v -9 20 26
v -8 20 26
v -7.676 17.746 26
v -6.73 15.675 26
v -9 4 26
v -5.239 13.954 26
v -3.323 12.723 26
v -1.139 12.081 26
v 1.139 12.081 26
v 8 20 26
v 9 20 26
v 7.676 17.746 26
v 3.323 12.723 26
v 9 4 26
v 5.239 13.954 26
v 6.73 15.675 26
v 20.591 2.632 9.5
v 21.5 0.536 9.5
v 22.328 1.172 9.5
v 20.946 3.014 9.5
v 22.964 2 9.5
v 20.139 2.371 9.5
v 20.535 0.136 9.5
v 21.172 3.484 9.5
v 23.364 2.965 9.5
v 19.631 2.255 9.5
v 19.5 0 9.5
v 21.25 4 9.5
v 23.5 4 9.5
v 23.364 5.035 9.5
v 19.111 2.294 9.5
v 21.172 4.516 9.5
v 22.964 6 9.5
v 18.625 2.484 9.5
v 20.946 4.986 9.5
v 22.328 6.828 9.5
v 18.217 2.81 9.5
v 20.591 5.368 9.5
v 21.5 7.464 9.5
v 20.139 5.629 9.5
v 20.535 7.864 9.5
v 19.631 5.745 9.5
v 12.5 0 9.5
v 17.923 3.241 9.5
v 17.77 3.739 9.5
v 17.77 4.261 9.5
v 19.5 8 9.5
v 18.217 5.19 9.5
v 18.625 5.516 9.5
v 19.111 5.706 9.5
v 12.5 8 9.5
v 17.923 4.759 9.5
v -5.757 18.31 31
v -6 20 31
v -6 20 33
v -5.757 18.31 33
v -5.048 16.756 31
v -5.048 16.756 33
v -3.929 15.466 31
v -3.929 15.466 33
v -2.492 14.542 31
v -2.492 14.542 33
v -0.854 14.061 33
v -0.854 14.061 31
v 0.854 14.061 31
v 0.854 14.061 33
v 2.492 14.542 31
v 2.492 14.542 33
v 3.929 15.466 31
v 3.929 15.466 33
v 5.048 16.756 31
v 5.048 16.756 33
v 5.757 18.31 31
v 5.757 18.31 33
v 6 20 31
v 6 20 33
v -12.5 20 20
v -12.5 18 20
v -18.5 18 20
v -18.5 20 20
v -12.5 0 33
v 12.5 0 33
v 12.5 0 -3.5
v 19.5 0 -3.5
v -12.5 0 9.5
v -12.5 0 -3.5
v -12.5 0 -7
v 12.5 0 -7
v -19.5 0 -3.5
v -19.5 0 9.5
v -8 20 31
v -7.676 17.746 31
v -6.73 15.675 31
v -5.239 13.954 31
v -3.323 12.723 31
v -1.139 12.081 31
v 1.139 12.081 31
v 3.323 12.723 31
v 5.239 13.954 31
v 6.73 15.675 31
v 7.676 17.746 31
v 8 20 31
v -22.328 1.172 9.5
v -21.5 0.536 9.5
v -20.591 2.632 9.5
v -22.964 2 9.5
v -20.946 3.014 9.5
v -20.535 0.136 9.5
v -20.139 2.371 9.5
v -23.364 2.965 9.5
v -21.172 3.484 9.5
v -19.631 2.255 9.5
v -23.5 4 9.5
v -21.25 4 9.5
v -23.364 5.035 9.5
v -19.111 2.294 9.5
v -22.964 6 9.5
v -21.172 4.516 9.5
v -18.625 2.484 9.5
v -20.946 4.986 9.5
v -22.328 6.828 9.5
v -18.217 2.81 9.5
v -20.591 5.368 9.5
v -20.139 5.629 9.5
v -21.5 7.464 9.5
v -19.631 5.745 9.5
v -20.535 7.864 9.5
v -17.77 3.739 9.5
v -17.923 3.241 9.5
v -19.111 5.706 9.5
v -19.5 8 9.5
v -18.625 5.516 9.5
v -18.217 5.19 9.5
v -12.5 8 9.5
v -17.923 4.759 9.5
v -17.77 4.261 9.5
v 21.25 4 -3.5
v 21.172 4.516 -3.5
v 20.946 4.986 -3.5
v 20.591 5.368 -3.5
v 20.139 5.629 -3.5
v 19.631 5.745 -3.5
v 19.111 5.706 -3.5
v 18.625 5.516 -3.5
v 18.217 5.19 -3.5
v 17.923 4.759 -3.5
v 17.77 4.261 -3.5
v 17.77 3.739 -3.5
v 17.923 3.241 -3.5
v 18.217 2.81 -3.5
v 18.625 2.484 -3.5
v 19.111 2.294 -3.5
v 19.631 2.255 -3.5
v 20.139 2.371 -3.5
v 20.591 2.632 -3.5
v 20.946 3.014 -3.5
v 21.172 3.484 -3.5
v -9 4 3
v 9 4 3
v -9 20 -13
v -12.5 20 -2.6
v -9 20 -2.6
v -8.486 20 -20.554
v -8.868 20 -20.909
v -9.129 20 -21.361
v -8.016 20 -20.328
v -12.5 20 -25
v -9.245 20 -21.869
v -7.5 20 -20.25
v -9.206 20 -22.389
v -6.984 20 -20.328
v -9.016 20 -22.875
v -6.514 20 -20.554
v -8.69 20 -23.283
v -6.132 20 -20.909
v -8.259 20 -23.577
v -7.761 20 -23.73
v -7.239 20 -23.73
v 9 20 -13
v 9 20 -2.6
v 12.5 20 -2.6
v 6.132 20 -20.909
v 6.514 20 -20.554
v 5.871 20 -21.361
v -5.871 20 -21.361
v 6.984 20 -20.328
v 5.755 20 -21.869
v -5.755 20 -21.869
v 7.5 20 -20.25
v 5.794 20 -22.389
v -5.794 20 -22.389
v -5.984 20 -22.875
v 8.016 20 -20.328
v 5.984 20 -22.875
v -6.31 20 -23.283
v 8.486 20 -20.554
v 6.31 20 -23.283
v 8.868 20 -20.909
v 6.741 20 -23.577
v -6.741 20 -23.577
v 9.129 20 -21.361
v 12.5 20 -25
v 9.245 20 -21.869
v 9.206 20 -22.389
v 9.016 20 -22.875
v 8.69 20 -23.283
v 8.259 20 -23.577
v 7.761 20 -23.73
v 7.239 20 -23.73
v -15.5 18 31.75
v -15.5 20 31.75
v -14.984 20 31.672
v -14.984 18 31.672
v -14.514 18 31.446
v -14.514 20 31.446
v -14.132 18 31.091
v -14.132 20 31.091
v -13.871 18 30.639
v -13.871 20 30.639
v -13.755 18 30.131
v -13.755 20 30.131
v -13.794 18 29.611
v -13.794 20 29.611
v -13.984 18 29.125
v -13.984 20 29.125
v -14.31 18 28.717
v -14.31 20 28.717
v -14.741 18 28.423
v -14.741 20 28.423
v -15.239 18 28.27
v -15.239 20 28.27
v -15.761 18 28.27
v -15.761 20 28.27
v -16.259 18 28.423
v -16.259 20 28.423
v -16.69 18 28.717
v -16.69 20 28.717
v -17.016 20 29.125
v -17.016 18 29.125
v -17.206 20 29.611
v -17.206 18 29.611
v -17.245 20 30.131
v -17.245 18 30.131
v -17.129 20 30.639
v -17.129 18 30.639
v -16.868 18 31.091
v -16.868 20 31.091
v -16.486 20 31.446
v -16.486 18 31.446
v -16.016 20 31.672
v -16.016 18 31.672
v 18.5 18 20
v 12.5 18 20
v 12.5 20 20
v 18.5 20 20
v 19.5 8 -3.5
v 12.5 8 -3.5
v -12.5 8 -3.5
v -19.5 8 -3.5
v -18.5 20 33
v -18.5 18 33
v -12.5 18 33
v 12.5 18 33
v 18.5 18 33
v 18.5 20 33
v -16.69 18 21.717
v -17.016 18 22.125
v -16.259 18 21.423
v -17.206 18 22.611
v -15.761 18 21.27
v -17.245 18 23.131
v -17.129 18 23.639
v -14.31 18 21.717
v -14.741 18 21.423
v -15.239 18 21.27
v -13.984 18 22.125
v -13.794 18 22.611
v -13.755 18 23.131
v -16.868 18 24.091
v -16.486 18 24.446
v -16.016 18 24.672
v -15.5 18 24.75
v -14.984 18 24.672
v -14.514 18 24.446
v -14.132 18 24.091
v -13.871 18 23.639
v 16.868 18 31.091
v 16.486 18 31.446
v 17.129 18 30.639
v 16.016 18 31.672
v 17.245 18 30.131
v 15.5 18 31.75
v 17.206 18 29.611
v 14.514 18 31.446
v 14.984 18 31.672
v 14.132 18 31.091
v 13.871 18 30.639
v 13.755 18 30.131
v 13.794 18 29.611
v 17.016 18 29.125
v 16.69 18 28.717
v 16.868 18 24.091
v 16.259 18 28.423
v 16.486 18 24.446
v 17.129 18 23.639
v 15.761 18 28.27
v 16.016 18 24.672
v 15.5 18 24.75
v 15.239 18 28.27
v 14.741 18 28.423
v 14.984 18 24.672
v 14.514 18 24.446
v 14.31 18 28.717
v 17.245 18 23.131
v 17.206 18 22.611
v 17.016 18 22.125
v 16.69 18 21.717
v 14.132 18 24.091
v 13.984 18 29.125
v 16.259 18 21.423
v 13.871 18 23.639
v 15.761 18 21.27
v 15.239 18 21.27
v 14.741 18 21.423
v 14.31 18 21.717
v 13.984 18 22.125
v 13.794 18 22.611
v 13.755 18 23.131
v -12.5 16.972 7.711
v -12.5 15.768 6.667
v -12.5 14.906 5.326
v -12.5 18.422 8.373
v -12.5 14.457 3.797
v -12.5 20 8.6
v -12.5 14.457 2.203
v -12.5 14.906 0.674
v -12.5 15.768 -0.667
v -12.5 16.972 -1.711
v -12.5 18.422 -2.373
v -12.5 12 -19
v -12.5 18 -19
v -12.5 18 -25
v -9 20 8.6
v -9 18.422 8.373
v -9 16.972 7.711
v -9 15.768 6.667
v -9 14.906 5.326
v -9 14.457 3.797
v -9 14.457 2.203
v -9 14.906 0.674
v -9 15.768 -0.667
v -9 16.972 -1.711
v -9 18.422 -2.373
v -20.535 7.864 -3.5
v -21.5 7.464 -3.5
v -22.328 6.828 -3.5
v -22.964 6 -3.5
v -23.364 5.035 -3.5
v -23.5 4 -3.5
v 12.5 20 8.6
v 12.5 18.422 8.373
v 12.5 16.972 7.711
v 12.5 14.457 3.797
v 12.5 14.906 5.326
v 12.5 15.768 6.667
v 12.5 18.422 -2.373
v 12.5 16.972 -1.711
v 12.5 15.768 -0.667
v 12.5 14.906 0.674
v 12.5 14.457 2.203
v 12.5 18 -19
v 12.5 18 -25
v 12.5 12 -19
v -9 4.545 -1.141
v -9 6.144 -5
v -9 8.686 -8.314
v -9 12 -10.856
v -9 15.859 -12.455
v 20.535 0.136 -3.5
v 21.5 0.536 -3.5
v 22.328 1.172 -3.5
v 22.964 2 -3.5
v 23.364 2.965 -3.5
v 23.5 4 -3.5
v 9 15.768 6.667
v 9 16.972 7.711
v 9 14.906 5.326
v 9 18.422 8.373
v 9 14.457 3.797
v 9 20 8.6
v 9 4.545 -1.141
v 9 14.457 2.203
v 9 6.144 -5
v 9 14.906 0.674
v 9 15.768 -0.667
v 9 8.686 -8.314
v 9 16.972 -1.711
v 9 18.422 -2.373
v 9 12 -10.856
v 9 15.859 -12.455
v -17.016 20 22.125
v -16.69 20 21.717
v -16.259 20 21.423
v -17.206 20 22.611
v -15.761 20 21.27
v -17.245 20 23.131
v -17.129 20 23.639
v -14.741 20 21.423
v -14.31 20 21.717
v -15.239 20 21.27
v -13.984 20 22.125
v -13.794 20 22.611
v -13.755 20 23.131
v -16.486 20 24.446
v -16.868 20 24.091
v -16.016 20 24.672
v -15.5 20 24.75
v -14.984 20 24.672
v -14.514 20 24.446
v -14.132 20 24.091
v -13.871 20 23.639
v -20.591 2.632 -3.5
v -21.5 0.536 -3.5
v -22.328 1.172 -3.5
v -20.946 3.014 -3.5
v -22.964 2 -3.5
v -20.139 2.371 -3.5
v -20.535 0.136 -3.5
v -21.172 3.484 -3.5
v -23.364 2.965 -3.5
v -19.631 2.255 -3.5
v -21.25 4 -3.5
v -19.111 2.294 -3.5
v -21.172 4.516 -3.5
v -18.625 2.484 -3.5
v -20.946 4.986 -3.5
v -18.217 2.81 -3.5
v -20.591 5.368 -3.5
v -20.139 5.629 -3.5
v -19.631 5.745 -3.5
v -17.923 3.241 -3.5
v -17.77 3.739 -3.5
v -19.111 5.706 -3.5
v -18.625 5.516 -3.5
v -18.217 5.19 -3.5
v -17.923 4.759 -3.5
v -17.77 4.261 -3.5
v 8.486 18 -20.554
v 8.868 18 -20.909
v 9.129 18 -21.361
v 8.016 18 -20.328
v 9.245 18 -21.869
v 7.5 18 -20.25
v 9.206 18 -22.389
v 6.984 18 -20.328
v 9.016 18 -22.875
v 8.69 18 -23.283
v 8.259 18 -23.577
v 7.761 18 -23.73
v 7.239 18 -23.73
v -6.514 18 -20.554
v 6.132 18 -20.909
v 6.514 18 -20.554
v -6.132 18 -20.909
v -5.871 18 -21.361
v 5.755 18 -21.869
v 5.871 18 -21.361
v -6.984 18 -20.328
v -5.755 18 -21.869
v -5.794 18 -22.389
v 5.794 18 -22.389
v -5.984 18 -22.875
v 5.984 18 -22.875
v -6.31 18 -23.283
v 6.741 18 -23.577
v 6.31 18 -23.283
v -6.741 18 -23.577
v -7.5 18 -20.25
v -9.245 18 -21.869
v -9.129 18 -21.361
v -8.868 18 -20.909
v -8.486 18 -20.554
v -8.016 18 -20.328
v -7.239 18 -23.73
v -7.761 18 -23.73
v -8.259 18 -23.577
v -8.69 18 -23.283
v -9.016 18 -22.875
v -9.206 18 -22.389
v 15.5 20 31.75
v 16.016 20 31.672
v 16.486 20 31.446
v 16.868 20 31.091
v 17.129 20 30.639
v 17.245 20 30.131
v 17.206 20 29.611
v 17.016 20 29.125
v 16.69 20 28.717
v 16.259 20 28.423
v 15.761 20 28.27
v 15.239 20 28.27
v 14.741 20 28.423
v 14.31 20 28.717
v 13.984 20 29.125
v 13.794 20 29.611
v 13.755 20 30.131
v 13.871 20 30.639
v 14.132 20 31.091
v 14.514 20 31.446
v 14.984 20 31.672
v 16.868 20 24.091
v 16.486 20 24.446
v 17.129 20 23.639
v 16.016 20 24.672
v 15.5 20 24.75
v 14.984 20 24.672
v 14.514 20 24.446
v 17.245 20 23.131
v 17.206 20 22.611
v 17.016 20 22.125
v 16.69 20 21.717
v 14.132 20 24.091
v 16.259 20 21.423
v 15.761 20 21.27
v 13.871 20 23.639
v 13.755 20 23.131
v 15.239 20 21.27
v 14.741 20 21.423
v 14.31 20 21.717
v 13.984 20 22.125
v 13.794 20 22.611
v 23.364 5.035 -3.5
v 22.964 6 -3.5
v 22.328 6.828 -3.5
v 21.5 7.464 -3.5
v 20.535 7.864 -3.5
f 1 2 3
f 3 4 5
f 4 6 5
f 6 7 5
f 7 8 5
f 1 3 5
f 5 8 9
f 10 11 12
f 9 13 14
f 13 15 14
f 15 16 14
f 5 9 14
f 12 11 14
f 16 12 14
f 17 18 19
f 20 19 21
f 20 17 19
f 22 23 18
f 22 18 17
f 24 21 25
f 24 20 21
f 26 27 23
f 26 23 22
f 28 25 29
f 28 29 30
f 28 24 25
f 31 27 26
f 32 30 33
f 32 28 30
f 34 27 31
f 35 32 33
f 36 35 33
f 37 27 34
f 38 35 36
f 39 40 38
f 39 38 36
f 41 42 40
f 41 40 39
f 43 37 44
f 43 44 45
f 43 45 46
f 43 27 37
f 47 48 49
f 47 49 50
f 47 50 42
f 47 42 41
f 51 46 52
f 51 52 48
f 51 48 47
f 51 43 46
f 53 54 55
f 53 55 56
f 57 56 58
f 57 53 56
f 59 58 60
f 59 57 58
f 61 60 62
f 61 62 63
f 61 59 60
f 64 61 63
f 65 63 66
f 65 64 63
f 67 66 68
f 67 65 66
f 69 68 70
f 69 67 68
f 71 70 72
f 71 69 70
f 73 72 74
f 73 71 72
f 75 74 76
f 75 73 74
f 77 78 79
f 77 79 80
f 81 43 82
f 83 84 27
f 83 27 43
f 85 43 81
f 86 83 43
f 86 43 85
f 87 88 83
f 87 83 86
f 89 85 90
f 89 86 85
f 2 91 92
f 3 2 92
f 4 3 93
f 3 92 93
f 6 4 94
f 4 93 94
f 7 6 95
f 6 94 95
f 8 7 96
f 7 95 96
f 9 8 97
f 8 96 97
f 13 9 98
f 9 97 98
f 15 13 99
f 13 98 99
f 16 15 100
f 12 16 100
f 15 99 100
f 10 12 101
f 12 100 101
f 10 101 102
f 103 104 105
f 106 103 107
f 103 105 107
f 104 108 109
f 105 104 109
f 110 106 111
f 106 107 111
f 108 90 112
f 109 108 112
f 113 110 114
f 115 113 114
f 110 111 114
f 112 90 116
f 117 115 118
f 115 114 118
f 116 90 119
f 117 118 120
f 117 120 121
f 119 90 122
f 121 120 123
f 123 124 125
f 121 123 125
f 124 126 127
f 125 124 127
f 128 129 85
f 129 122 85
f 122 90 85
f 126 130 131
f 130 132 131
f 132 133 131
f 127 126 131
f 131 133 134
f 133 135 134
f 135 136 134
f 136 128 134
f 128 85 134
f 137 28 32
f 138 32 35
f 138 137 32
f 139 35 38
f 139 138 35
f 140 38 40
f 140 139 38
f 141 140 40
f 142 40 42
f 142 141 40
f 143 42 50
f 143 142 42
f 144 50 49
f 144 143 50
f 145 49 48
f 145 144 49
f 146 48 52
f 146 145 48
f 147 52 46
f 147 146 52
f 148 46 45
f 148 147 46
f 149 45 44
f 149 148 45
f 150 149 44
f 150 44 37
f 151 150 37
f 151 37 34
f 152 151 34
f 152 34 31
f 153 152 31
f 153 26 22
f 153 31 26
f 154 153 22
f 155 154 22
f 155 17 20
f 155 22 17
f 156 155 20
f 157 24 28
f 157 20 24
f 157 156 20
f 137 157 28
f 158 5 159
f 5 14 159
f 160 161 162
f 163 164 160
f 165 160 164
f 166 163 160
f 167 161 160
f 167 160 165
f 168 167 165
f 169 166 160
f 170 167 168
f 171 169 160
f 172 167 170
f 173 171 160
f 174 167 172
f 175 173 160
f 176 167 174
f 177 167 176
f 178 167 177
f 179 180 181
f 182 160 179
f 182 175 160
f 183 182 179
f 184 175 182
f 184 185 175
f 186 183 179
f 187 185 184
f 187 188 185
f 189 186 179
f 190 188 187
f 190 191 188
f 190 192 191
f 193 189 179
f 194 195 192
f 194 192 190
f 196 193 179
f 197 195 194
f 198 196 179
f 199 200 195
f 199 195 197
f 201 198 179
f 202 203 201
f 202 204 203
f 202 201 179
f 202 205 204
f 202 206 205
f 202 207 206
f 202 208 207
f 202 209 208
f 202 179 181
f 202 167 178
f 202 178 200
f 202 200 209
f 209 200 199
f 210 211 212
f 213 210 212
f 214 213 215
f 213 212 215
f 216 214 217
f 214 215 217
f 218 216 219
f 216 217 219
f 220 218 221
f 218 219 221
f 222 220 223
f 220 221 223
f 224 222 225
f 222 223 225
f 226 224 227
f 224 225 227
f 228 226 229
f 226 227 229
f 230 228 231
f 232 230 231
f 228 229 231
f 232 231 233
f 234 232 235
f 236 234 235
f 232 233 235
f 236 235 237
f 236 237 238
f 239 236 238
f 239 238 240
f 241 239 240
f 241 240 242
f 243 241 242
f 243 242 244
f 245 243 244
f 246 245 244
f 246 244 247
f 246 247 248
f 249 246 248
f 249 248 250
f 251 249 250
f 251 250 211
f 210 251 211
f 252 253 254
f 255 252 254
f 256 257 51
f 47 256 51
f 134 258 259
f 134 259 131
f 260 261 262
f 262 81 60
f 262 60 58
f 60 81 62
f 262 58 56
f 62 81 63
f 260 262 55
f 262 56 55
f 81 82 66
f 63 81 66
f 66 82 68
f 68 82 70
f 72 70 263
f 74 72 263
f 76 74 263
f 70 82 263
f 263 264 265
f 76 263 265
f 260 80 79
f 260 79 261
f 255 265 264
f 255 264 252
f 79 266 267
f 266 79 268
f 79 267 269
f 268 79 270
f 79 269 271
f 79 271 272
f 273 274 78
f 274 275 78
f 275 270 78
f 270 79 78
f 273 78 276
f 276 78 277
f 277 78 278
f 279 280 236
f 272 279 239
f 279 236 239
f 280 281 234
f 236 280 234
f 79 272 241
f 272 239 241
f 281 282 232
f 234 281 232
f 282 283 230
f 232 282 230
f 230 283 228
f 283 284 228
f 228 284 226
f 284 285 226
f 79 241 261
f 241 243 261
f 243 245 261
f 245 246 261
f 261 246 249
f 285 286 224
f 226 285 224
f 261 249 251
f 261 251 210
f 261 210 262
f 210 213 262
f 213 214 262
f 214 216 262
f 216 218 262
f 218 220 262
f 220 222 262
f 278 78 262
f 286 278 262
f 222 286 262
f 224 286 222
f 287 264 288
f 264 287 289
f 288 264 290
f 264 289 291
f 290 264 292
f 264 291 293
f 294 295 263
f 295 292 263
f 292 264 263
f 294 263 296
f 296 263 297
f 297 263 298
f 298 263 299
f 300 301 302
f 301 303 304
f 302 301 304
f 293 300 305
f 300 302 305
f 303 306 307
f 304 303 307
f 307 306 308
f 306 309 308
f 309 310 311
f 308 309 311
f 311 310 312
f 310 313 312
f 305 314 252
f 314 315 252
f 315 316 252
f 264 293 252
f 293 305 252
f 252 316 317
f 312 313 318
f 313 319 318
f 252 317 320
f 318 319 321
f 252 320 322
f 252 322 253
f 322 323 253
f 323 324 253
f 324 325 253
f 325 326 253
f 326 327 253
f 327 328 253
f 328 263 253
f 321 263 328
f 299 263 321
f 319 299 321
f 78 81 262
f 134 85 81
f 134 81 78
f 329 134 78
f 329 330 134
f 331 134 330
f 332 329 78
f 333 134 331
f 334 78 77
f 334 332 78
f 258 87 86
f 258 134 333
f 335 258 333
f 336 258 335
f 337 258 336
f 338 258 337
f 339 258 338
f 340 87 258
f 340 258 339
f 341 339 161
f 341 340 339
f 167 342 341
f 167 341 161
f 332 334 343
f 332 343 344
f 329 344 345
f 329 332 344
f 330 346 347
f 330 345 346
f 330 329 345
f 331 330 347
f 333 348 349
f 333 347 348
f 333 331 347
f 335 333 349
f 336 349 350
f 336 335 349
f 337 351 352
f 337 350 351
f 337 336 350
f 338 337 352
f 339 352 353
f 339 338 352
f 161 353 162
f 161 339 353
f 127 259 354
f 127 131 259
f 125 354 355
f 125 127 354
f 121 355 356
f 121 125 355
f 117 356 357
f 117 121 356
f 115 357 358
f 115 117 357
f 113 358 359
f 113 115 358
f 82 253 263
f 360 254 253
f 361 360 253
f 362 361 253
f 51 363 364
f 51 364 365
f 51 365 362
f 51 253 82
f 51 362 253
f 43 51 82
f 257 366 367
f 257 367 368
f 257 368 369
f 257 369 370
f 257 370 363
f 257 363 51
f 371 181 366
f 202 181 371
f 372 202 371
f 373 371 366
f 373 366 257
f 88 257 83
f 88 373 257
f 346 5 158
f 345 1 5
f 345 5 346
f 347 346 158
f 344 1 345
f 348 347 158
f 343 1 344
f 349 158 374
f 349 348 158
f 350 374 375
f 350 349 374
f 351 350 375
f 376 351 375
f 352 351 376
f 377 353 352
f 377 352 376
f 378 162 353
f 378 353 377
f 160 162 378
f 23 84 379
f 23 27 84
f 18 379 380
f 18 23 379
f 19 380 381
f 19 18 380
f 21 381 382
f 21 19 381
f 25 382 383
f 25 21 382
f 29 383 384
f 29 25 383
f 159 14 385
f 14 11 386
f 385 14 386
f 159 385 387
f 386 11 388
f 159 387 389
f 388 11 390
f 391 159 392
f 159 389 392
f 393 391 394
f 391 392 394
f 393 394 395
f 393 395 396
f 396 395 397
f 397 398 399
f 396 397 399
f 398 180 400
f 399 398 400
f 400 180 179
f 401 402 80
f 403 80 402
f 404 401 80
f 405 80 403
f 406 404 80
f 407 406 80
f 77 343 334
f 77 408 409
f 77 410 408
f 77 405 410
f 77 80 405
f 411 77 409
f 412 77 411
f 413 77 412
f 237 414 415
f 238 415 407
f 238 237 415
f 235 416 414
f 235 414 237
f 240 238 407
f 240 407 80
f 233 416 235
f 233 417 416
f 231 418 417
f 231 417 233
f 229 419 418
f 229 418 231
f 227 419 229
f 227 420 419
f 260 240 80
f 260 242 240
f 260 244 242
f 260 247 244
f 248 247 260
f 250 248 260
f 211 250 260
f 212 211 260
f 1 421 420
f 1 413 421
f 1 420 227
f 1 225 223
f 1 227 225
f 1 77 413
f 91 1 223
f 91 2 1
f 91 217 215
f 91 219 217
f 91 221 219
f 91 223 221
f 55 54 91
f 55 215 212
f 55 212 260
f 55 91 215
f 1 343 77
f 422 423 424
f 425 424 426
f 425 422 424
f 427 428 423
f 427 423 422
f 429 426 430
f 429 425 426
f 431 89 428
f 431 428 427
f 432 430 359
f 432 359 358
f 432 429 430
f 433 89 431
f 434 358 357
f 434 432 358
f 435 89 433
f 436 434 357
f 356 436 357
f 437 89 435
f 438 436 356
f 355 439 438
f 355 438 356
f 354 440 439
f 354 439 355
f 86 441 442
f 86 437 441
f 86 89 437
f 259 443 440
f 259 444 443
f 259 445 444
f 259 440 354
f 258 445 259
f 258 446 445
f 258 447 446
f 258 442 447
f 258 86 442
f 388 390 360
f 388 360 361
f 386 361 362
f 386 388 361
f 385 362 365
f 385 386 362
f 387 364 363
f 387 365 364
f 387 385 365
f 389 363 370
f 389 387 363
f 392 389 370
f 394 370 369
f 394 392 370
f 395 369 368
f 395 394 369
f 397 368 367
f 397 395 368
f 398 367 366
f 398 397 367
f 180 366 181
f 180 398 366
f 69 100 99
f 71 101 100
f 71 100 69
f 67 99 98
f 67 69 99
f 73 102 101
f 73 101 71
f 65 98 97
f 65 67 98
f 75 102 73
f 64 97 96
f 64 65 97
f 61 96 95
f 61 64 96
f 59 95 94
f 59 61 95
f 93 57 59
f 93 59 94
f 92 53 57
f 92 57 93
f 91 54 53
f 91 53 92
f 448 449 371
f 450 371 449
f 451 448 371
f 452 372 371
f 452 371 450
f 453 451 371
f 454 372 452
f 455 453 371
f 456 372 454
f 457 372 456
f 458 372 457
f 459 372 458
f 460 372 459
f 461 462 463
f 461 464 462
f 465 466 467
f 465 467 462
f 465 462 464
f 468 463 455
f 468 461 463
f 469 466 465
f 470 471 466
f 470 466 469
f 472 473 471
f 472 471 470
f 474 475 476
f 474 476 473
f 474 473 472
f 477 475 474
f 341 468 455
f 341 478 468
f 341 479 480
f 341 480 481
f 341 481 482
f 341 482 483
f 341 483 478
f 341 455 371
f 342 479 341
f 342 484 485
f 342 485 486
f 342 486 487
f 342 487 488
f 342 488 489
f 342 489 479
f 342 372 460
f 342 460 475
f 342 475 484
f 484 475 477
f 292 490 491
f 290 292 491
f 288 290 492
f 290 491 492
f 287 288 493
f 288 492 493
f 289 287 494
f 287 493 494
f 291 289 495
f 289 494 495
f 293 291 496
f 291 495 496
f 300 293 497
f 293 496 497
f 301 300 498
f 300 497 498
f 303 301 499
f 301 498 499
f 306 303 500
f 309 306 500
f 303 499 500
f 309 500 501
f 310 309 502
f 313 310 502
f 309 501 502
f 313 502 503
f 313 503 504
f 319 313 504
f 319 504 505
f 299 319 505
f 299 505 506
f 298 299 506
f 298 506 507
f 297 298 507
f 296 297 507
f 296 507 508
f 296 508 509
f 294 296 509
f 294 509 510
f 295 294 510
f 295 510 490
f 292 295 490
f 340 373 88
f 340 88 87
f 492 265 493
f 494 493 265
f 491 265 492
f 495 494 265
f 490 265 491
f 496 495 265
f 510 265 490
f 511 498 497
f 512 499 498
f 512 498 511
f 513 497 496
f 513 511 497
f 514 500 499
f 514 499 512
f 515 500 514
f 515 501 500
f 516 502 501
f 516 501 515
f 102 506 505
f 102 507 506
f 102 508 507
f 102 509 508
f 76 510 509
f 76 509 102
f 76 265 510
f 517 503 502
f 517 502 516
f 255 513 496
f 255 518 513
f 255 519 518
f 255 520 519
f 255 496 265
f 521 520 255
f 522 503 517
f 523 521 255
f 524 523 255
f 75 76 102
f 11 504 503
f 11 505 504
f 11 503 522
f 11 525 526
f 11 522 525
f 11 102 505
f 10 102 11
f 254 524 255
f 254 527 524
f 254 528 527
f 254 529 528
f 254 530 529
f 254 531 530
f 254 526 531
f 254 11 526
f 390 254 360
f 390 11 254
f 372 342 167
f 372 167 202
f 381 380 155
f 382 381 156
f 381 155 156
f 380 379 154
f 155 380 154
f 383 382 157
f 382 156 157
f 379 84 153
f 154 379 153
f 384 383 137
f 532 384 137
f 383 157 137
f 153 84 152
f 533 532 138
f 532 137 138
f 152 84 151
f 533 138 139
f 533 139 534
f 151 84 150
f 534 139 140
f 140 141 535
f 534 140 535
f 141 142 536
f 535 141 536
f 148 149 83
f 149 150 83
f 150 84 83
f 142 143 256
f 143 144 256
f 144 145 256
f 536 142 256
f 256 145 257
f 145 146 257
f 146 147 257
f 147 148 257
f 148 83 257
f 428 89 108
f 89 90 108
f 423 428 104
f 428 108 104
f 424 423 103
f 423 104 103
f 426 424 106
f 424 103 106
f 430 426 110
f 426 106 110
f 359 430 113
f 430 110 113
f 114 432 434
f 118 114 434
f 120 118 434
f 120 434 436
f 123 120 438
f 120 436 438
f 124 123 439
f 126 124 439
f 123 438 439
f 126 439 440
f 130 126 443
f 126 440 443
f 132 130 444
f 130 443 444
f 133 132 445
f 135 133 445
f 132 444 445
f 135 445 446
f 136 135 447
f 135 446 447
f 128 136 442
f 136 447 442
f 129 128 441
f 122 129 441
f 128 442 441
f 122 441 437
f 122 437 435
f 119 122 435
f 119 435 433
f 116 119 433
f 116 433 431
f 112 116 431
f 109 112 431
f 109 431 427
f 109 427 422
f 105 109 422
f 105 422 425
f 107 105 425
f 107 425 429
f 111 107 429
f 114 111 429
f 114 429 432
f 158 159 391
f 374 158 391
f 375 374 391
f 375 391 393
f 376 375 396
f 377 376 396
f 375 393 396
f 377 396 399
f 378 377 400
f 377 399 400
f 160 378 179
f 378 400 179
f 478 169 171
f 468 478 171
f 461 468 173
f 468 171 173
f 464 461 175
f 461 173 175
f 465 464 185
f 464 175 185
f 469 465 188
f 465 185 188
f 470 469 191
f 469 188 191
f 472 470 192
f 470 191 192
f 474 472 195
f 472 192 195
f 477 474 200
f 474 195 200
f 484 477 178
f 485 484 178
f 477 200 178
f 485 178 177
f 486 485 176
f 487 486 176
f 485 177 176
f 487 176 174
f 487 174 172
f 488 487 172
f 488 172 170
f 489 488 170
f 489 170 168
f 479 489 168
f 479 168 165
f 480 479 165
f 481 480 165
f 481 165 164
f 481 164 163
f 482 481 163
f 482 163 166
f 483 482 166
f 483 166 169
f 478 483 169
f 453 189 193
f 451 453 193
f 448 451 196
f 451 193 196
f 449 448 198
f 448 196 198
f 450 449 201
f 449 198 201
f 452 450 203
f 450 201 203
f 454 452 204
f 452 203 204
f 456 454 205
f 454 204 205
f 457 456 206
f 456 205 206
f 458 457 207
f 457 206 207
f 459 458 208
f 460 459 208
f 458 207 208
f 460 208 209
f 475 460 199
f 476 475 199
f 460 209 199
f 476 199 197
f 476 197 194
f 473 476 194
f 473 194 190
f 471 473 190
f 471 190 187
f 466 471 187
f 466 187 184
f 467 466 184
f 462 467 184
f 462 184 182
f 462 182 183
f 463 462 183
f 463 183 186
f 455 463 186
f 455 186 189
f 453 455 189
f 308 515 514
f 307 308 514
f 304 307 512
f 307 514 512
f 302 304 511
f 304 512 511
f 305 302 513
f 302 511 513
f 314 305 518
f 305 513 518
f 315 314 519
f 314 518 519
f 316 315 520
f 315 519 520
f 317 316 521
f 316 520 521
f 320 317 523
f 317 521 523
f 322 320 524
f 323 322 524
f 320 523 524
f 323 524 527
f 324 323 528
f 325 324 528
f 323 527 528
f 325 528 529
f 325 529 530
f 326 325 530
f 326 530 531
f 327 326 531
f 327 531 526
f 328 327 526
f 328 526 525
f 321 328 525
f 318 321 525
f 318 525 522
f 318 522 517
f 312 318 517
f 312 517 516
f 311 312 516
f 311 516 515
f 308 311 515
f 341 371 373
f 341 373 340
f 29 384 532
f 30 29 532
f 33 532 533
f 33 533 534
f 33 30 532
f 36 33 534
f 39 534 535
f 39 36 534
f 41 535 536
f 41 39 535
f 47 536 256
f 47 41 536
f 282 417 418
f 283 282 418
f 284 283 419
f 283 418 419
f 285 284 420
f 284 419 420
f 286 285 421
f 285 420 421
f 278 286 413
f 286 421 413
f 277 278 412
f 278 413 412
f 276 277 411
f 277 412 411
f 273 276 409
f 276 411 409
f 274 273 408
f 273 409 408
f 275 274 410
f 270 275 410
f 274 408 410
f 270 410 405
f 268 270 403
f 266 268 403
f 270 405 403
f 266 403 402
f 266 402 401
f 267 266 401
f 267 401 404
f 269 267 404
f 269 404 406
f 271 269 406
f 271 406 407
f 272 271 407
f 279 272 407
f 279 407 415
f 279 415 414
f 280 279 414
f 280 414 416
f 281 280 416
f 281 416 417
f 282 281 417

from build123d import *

# Parameters (mm, degrees)
CROQUIS2_W                 = 25
CROQUIS2_H                 = 50
SALIENTE_EXTRUIR2_DEPTH    = 20
CROQUIS19_W                = 25
CROQUIS19_H                = 20
SALIENTE_EXTRUIR8_DEPTH    = 6
CORTAR_EXTRUIR1_DEPTH      = 9
CORTAR_EXTRUIR2_DEPTH      = 39.951893407
CORTAR_EXTRUIR2_DEPTH_BACK = 39.951893407
CROQUIS9_R                 = 8
CORTAR_EXTRUIR3_DEPTH      = 5
SALIENTE_EXTRUIR9_DEPTH    = 2
CROQUIS11_W                = 13
CROQUIS11_H                = 2
SALIENTE_EXTRUIR4_DEPTH    = 6
CROQUIS13_W                = 13
CROQUIS13_H                = 2
SALIENTE_EXTRUIR5_DEPTH    = 6
CROQUIS16_R                = 1.75
CORTAR_EXTRUIR6_DEPTH      = 43.793106922
CROQUIS17_W                = 13
CROQUIS17_H                = 8
SALIENTE_EXTRUIR7_DEPTH    = 11
REDONDEO1_R                = 4
CROQUIS12_R                = 1.75
CORTAR_EXTRUIR4_DEPTH      = 46.180194776
CROQUIS14_R                = 1.75
CORTAR_EXTRUIR5_DEPTH      = 46.180194776
CROQUIS18_R                = 1.75
CORTAR_EXTRUIR7_DEPTH      = 48.796443382
REDONDEO1_OF_SIMETR_A1_R   = 4
CROQUIS23_W                = 25
CROQUIS23_H                = 18
CORTAR_EXTRUIR9_DEPTH      = 6
CHAFL_N1_SIZE              = 12


with BuildPart() as part:
    # Croquis2 → Saliente-Extruir2 (new body)
    with BuildSketch(Plane(origin=(0, 0, 0), x_dir=(1, 0, 0), z_dir=(0, 1, 0))):
        Rectangle(CROQUIS2_W, CROQUIS2_H)
    extrude(amount=SALIENTE_EXTRUIR2_DEPTH)

    # Croquis19 → Saliente-Extruir8 (add)
    with BuildSketch(Plane.XY.offset(25)):
        with Locations((0, 10)):
            Rectangle(CROQUIS19_W, CROQUIS19_H)
    extrude(amount=SALIENTE_EXTRUIR8_DEPTH)

    # Croquis4 → Cortar-Extruir1 (cut, symmetric)
    with BuildSketch(Plane(origin=(0, 0, 0), x_dir=(0, 0, -1), z_dir=(1, 0, 0))):
        with BuildLine():
            Line((-26, 4), (-3, 4))
            ThreePointArc((-3, 4), (8.313708499, 8.686291501), (13, 20))
            Line((13, 20), (-26, 20))
            Line((-26, 20), (-26, 4))
        make_face()
    extrude(amount=CORTAR_EXTRUIR1_DEPTH, both=True, mode=Mode.SUBTRACT)

    # Croquis5 → Cortar-Extruir2 (cut, two sides: drawn at the far end of the back side and taken through both)
    with BuildSketch(Plane(origin=(0, 0, 0), x_dir=(0, 0, -1), z_dir=(1, 0, 0)).offset(-CORTAR_EXTRUIR2_DEPTH_BACK)):
        with BuildLine():
            ThreePointArc((2.6, 20), (-3, 25.6), (-8.6, 20))
            Line((-8.6, 20), (2.6, 20))
        make_face()
        with BuildLine():
            Line((2.6, 20), (-8.6, 20))
            ThreePointArc((-8.6, 20), (-3, 14.4), (2.6, 20))
        make_face()
    extrude(amount=CORTAR_EXTRUIR2_DEPTH + CORTAR_EXTRUIR2_DEPTH_BACK, mode=Mode.SUBTRACT)

    # Croquis9 → Cortar-Extruir3 (cut)
    with BuildSketch(Plane.XY.offset(31)):
        with Locations((0, 20)):
            Circle(CROQUIS9_R)
    extrude(amount=-CORTAR_EXTRUIR3_DEPTH, mode=Mode.SUBTRACT)

    # Croquis22 → Saliente-Extruir9 (add)
    with BuildSketch(Plane.XY.offset(31)):
        with BuildLine():
            Line((6, 20), (12.5, 20))
            Line((12.5, 20), (12.5, 0))
            Line((12.5, 0), (-12.5, 0))
            Line((-12.5, 0), (-12.5, 20))
            Line((-12.5, 20), (-6, 20))
            ThreePointArc((-6, 20), (0, 14), (6, 20))
        make_face()
    extrude(amount=SALIENTE_EXTRUIR9_DEPTH)

    # Croquis11 → Saliente-Extruir4 (add)
    with BuildSketch(Plane(origin=(12.5, 0, 0), x_dir=(0, 0, -1), z_dir=(1, 0, 0))):
        with Locations((-26.5, 19)):
            Rectangle(CROQUIS11_W, CROQUIS11_H)
    extrude(amount=SALIENTE_EXTRUIR4_DEPTH)

    # Croquis13 → Saliente-Extruir5 (add)
    with BuildSketch(Plane.ZY.offset(12.5)):
        with Locations((26.5, 19)):
            Rectangle(CROQUIS13_W, CROQUIS13_H)
    extrude(amount=SALIENTE_EXTRUIR5_DEPTH)

    # Croquis16 → Cortar-Extruir6 (cut, through all)
    with BuildSketch(Plane(origin=(0, 20, 0), x_dir=(1, 0, 0), z_dir=(0, 1, 0))):
        with Locations(Location((-7.5, 22, 0), (0, 0, 270))):
            Circle(CROQUIS16_R)
        with Locations(Location((7.5, 22, 0), (0, 0, 270))):
            Circle(CROQUIS16_R)
    extrude(amount=-CORTAR_EXTRUIR6_DEPTH, mode=Mode.SUBTRACT)

    # Croquis17 → Saliente-Extruir7 (add)
    with BuildSketch(Plane.ZY.offset(12.5)):
        with Locations((3, 4)):
            Rectangle(CROQUIS17_W, CROQUIS17_H)
    saliente_extruir7 = extrude(amount=SALIENTE_EXTRUIR7_DEPTH)

    # Redondeo1
    redondeo1_edges = [part.edges().sort_by_distance(p)[0] for p in [
        (-23.5, 0, 3),
        (-23.5, 8, 3),
    ]]
    fillet(redondeo1_edges, radius=REDONDEO1_R - 0.0001)  # a hair under: the kernel refuses the full size

    # Croquis12 → Cortar-Extruir4 (cut, through all)
    with BuildSketch(Plane(origin=(0, 20, 0), x_dir=(1, 0, 0), z_dir=(0, 1, 0))):
        with Locations(Location((15.5, -23, 0), (0, 0, 270))):
            Circle(CROQUIS12_R)
        with Locations(Location((15.5, -30, 0), (0, 0, 270))):
            Circle(CROQUIS12_R)
    extrude(amount=-CORTAR_EXTRUIR4_DEPTH, mode=Mode.SUBTRACT)

    # Croquis14 → Cortar-Extruir5 (cut, through all)
    with BuildSketch(Plane(origin=(0, 20, 0), x_dir=(1, 0, 0), z_dir=(0, 1, 0))):
        with Locations(Location((-15.5, -23, 0), (0, 0, 270))):
            Circle(CROQUIS14_R)
        with Locations(Location((-15.5, -30, 0), (0, 0, 270))):
            Circle(CROQUIS14_R)
    extrude(amount=-CORTAR_EXTRUIR5_DEPTH, mode=Mode.SUBTRACT)

    # Croquis18 → Cortar-Extruir7 (cut, through all)
    with BuildSketch(Plane(origin=(0, 0, -3.5), x_dir=(-1, 0, 0), z_dir=(0, 0, -1))):
        with Locations((19.5, 4)):
            Circle(CROQUIS18_R)
    cortar_extruir7 = extrude(amount=-CORTAR_EXTRUIR7_DEPTH, mode=Mode.SUBTRACT)

    # Simetría1: Saliente-Extruir7, Cortar-Extruir7 across plane
    add(saliente_extruir7.mirror(Plane(origin=(0, 0, 0), x_dir=(0, 0, 1), z_dir=(1, 0, 0))))
    add(cortar_extruir7.mirror(Plane(origin=(0, 0, 0), x_dir=(0, 0, 1), z_dir=(1, 0, 0))), mode=Mode.SUBTRACT)

    # Redondeo1 of Simetría1
    redondeo1_of_simetr_a1_edges = [part.edges().sort_by_distance(p)[0] for p in [
        (23.5, 0, 3),
        (23.5, 8, 3),
    ]]
    fillet(redondeo1_of_simetr_a1_edges, radius=REDONDEO1_OF_SIMETR_A1_R - 0.0001)  # a hair under: the kernel refuses the full size

    # Croquis23 → Cortar-Extruir9 (cut)
    with BuildSketch(Plane(origin=(0, 0, -25), x_dir=(-1, 0, 0), z_dir=(0, 0, -1))):
        with Locations((0, 9)):
            Rectangle(CROQUIS23_W, CROQUIS23_H)
    extrude(amount=-CORTAR_EXTRUIR9_DEPTH, mode=Mode.SUBTRACT)

    # Chaflán1
    chafl_n1_edges = [part.edges().sort_by_distance(p)[0] for p in [
        (0, 0, -19),
    ]]
    chamfer(chafl_n1_edges, length=CHAFL_N1_SIZE)


solid = part.part
